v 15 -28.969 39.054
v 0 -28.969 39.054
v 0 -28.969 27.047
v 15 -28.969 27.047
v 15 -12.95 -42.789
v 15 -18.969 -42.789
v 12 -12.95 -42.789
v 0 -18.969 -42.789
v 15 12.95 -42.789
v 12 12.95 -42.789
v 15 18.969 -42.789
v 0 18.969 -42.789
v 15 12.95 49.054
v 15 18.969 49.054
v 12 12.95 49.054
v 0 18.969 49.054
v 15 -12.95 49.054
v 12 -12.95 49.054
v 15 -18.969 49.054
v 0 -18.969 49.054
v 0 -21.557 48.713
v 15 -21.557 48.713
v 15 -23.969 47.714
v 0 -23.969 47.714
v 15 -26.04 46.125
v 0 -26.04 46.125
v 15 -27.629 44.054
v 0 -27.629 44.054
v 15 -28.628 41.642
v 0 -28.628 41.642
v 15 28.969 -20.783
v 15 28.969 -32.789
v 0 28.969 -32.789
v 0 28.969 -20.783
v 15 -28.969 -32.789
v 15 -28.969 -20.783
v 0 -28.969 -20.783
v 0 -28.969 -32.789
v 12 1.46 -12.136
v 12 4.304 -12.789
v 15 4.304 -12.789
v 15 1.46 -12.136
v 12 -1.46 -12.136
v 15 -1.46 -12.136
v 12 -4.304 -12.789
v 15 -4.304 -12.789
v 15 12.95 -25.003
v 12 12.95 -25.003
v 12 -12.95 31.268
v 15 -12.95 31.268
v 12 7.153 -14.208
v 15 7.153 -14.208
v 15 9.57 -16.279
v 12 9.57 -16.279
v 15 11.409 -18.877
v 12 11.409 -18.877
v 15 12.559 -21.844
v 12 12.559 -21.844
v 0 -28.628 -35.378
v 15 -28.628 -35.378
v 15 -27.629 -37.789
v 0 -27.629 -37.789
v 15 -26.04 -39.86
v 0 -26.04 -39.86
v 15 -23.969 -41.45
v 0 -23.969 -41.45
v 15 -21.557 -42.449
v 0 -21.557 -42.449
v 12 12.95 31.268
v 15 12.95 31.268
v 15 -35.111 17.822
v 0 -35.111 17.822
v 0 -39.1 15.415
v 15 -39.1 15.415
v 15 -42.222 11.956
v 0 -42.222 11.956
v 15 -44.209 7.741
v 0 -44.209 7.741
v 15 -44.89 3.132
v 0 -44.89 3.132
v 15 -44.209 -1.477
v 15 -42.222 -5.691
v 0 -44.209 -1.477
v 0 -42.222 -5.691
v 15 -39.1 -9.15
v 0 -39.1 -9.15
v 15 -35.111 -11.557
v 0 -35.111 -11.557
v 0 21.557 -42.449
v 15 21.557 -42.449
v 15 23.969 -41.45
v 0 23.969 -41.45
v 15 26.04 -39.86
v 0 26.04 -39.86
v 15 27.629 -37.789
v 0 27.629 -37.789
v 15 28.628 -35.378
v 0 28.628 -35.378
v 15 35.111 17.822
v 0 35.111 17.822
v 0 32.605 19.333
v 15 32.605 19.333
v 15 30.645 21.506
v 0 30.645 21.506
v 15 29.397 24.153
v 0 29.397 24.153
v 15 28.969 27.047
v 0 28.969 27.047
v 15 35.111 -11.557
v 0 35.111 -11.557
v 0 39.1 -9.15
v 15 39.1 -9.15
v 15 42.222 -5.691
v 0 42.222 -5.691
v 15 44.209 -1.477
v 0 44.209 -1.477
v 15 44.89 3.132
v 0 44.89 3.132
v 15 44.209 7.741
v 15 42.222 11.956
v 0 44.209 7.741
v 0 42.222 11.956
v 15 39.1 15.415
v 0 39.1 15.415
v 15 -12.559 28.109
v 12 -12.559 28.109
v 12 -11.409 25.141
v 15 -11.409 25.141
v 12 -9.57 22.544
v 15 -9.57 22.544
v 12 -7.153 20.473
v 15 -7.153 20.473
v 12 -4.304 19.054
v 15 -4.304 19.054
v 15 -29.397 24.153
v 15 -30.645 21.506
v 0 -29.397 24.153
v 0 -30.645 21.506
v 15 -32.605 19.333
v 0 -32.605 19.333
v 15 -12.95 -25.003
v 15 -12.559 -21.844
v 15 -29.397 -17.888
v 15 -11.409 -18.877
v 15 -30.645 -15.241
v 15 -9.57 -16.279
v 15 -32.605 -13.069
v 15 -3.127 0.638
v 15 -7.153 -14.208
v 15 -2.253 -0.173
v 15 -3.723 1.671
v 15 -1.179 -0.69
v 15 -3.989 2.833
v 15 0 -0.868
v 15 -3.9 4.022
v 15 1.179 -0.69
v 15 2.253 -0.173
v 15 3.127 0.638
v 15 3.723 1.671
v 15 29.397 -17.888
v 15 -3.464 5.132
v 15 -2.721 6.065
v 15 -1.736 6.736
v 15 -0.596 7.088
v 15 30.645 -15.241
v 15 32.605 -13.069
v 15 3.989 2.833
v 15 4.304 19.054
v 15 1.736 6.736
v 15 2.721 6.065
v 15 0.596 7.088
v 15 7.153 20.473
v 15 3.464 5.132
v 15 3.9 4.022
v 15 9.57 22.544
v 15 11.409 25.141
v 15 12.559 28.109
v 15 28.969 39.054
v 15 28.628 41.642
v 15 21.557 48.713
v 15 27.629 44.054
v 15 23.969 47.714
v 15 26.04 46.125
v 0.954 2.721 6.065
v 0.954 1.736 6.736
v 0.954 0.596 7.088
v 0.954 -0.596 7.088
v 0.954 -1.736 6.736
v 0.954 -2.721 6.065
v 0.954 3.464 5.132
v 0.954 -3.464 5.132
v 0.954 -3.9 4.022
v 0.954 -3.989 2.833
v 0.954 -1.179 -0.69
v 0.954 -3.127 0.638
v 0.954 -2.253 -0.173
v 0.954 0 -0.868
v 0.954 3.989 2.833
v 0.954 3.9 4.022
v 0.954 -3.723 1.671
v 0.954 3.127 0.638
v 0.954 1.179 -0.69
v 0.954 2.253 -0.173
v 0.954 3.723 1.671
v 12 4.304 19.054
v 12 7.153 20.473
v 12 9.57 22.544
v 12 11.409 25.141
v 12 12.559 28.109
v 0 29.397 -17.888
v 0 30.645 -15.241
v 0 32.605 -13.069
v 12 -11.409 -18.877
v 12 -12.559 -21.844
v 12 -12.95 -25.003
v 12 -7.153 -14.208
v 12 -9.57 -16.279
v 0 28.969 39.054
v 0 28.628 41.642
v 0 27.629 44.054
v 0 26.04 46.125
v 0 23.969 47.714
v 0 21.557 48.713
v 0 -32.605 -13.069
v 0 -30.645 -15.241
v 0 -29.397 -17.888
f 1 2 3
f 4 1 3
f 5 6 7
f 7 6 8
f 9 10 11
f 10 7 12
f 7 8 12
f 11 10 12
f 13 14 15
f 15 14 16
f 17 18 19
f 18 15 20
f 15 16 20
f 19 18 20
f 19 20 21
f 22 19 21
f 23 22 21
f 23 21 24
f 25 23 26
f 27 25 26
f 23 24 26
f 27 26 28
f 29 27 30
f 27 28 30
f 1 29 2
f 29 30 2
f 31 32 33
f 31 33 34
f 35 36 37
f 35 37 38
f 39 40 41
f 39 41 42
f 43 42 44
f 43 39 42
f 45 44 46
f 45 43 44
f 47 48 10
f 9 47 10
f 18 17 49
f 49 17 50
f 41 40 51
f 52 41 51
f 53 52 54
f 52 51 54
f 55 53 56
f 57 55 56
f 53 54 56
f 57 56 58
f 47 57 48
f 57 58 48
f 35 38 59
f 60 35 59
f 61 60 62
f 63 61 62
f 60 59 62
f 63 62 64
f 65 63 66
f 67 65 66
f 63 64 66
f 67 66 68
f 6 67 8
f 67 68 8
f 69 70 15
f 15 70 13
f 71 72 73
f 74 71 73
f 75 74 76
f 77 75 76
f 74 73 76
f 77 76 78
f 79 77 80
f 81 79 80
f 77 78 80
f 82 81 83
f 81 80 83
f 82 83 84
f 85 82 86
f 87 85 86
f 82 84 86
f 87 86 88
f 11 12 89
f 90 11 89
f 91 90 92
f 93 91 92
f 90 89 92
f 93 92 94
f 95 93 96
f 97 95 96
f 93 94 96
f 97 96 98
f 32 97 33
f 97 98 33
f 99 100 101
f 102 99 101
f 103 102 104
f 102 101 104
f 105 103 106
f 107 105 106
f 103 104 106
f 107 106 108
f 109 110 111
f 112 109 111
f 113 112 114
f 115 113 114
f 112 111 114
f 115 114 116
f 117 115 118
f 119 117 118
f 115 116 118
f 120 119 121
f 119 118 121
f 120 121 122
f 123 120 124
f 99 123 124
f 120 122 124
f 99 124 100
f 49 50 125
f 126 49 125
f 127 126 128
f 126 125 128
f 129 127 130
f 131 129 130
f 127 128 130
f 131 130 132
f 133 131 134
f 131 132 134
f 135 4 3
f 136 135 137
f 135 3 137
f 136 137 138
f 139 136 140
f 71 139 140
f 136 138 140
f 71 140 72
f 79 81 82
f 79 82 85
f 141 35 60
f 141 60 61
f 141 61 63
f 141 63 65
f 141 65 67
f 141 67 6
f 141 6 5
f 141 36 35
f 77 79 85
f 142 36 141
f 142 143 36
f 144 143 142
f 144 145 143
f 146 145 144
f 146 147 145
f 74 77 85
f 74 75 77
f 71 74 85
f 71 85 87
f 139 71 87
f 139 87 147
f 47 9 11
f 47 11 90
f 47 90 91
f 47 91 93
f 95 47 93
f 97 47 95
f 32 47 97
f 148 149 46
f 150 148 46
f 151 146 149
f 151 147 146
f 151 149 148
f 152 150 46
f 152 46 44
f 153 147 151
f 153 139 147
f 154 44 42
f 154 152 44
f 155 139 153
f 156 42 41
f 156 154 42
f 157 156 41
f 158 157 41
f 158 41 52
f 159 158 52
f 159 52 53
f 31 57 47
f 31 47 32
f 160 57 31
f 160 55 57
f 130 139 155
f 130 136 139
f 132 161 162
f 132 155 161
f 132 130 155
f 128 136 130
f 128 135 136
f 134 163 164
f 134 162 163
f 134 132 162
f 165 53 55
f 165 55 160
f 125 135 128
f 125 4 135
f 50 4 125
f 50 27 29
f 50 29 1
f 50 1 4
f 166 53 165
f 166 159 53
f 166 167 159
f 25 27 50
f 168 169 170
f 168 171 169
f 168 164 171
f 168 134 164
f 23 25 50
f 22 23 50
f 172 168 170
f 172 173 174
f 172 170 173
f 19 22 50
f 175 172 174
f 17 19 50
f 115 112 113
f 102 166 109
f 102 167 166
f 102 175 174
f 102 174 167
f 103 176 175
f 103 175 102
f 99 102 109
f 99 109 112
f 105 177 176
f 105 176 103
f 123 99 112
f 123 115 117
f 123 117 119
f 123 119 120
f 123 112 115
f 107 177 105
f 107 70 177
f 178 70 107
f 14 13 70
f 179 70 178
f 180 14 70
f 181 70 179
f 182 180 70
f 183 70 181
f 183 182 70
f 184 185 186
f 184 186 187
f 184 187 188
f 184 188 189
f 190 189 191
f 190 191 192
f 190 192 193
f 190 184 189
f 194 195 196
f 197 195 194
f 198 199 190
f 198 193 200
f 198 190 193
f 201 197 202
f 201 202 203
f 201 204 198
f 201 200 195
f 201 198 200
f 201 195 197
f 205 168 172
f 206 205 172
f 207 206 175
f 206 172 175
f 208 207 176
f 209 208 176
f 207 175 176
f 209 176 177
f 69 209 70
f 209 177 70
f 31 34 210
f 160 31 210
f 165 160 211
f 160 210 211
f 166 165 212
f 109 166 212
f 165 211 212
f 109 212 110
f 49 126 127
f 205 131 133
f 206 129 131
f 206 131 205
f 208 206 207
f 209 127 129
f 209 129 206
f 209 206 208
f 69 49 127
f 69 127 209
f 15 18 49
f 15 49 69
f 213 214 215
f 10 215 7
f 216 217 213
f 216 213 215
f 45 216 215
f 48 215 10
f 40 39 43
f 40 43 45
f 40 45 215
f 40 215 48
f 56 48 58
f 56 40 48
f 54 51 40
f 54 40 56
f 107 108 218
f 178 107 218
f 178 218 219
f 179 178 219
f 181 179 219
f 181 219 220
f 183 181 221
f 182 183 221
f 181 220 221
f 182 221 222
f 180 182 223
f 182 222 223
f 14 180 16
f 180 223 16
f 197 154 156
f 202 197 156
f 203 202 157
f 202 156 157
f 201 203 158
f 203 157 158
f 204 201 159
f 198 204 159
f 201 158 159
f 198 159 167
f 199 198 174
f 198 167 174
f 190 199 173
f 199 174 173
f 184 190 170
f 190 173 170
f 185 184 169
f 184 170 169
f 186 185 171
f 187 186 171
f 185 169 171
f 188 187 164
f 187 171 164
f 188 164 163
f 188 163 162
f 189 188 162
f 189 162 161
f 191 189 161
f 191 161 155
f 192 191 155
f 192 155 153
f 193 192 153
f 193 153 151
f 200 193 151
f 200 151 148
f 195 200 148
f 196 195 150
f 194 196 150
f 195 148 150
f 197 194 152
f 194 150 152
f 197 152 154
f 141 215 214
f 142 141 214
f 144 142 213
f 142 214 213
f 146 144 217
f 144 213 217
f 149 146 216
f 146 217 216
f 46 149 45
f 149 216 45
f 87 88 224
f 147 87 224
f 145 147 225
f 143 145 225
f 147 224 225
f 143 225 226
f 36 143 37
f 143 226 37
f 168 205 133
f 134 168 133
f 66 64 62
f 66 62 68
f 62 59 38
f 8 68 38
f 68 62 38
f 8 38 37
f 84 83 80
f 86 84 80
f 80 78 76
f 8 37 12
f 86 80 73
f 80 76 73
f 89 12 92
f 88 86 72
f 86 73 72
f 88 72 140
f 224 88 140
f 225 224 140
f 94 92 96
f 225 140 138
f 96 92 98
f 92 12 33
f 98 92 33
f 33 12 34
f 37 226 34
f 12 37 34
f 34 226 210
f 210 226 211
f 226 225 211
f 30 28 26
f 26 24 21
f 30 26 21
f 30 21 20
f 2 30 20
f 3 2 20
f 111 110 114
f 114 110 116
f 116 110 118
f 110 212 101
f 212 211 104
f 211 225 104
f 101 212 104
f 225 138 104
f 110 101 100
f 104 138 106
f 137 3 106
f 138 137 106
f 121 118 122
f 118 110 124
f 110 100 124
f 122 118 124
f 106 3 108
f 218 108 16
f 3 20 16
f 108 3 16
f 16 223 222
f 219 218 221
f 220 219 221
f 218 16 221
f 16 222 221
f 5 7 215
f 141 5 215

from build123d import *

# Parameters (mm, degrees)
BOSS_EXTRUDE3_DEPTH = 15
SKETCH3_R           = 4
CUT_EXTRUDE3_DEPTH  = 14.0462
CUT_EXTRUDE4_DEPTH  = 3


with BuildPart() as part:
    # Sketch1 → Boss-Extrude3 (new body)
    with BuildSketch(Plane.YZ):
        with BuildLine():
            Line((-28.968617751, -12.789334175), (28.968617751, -12.789334175))
            ThreePointArc((28.968617751, -12.789334175), (44.579120821, 0), (35.110840206, 17.821518929))
            ThreePointArc((35.110840206, 17.821518929), (30.644623053, 21.505675602), (28.968617751, 27.047436358))
            Line((28.968617751, 27.047436358), (28.968617751, 39.053986921))
            ThreePointArc((28.968617751, 39.053986921), (26.039685563, 46.125054733), (18.968617751, 49.053986921))
            Line((18.968617751, 49.053986921), (-18.968617751, 49.053986921))
            ThreePointArc((-18.968617751, 49.053986921), (-26.039685563, 46.125054733), (-28.968617751, 39.053986921))
            Line((-28.968617751, 39.053986921), (-28.968617751, 27.047436358))
            ThreePointArc((-28.968617751, 27.047436358), (-30.644623053, 21.505675602), (-35.110840206, 17.821518929))
            ThreePointArc((-35.110840206, 17.821518929), (-44.579120821, 0), (-28.968617751, -12.789334175))
        make_face()
    boss_extrude3 = extrude(amount=BOSS_EXTRUDE3_DEPTH)

    # Sketch3 → Cut-Extrude3 (cut)
    with BuildSketch(Plane.YZ.offset(15)):
        with Locations((0, 3.132326373)):
            Circle(SKETCH3_R)
    cut_extrude3 = extrude(amount=-CUT_EXTRUDE3_DEPTH, mode=Mode.SUBTRACT)

    # Sketch4 → Cut-Extrude4 (cut)
    with BuildSketch(Plane.YZ.offset(15)):
        with BuildLine():
            Line((-12.95, 49.053986921), (-12.95, 31.267703884))
            ThreePointArc((-12.95, 31.267703884), (0, 18.317703884), (12.95, 31.267703884))
            Line((12.95, 31.267703884), (12.95, 49.053986921))
            Line((12.95, 49.053986921), (-12.95, 49.053986921))
        make_face()
    cut_extrude4 = extrude(amount=-CUT_EXTRUDE4_DEPTH, mode=Mode.SUBTRACT)

    # Mirror1: Boss-Extrude3, Cut-Extrude3, Cut-Extrude4 across plane
    add(boss_extrude3.mirror(Plane.XY.offset(3.132326373)))
    add(cut_extrude3.mirror(Plane.XY.offset(3.132326373)), mode=Mode.SUBTRACT)
    add(cut_extrude4.mirror(Plane.XY.offset(3.132326373)), mode=Mode.SUBTRACT)


solid = part.part
